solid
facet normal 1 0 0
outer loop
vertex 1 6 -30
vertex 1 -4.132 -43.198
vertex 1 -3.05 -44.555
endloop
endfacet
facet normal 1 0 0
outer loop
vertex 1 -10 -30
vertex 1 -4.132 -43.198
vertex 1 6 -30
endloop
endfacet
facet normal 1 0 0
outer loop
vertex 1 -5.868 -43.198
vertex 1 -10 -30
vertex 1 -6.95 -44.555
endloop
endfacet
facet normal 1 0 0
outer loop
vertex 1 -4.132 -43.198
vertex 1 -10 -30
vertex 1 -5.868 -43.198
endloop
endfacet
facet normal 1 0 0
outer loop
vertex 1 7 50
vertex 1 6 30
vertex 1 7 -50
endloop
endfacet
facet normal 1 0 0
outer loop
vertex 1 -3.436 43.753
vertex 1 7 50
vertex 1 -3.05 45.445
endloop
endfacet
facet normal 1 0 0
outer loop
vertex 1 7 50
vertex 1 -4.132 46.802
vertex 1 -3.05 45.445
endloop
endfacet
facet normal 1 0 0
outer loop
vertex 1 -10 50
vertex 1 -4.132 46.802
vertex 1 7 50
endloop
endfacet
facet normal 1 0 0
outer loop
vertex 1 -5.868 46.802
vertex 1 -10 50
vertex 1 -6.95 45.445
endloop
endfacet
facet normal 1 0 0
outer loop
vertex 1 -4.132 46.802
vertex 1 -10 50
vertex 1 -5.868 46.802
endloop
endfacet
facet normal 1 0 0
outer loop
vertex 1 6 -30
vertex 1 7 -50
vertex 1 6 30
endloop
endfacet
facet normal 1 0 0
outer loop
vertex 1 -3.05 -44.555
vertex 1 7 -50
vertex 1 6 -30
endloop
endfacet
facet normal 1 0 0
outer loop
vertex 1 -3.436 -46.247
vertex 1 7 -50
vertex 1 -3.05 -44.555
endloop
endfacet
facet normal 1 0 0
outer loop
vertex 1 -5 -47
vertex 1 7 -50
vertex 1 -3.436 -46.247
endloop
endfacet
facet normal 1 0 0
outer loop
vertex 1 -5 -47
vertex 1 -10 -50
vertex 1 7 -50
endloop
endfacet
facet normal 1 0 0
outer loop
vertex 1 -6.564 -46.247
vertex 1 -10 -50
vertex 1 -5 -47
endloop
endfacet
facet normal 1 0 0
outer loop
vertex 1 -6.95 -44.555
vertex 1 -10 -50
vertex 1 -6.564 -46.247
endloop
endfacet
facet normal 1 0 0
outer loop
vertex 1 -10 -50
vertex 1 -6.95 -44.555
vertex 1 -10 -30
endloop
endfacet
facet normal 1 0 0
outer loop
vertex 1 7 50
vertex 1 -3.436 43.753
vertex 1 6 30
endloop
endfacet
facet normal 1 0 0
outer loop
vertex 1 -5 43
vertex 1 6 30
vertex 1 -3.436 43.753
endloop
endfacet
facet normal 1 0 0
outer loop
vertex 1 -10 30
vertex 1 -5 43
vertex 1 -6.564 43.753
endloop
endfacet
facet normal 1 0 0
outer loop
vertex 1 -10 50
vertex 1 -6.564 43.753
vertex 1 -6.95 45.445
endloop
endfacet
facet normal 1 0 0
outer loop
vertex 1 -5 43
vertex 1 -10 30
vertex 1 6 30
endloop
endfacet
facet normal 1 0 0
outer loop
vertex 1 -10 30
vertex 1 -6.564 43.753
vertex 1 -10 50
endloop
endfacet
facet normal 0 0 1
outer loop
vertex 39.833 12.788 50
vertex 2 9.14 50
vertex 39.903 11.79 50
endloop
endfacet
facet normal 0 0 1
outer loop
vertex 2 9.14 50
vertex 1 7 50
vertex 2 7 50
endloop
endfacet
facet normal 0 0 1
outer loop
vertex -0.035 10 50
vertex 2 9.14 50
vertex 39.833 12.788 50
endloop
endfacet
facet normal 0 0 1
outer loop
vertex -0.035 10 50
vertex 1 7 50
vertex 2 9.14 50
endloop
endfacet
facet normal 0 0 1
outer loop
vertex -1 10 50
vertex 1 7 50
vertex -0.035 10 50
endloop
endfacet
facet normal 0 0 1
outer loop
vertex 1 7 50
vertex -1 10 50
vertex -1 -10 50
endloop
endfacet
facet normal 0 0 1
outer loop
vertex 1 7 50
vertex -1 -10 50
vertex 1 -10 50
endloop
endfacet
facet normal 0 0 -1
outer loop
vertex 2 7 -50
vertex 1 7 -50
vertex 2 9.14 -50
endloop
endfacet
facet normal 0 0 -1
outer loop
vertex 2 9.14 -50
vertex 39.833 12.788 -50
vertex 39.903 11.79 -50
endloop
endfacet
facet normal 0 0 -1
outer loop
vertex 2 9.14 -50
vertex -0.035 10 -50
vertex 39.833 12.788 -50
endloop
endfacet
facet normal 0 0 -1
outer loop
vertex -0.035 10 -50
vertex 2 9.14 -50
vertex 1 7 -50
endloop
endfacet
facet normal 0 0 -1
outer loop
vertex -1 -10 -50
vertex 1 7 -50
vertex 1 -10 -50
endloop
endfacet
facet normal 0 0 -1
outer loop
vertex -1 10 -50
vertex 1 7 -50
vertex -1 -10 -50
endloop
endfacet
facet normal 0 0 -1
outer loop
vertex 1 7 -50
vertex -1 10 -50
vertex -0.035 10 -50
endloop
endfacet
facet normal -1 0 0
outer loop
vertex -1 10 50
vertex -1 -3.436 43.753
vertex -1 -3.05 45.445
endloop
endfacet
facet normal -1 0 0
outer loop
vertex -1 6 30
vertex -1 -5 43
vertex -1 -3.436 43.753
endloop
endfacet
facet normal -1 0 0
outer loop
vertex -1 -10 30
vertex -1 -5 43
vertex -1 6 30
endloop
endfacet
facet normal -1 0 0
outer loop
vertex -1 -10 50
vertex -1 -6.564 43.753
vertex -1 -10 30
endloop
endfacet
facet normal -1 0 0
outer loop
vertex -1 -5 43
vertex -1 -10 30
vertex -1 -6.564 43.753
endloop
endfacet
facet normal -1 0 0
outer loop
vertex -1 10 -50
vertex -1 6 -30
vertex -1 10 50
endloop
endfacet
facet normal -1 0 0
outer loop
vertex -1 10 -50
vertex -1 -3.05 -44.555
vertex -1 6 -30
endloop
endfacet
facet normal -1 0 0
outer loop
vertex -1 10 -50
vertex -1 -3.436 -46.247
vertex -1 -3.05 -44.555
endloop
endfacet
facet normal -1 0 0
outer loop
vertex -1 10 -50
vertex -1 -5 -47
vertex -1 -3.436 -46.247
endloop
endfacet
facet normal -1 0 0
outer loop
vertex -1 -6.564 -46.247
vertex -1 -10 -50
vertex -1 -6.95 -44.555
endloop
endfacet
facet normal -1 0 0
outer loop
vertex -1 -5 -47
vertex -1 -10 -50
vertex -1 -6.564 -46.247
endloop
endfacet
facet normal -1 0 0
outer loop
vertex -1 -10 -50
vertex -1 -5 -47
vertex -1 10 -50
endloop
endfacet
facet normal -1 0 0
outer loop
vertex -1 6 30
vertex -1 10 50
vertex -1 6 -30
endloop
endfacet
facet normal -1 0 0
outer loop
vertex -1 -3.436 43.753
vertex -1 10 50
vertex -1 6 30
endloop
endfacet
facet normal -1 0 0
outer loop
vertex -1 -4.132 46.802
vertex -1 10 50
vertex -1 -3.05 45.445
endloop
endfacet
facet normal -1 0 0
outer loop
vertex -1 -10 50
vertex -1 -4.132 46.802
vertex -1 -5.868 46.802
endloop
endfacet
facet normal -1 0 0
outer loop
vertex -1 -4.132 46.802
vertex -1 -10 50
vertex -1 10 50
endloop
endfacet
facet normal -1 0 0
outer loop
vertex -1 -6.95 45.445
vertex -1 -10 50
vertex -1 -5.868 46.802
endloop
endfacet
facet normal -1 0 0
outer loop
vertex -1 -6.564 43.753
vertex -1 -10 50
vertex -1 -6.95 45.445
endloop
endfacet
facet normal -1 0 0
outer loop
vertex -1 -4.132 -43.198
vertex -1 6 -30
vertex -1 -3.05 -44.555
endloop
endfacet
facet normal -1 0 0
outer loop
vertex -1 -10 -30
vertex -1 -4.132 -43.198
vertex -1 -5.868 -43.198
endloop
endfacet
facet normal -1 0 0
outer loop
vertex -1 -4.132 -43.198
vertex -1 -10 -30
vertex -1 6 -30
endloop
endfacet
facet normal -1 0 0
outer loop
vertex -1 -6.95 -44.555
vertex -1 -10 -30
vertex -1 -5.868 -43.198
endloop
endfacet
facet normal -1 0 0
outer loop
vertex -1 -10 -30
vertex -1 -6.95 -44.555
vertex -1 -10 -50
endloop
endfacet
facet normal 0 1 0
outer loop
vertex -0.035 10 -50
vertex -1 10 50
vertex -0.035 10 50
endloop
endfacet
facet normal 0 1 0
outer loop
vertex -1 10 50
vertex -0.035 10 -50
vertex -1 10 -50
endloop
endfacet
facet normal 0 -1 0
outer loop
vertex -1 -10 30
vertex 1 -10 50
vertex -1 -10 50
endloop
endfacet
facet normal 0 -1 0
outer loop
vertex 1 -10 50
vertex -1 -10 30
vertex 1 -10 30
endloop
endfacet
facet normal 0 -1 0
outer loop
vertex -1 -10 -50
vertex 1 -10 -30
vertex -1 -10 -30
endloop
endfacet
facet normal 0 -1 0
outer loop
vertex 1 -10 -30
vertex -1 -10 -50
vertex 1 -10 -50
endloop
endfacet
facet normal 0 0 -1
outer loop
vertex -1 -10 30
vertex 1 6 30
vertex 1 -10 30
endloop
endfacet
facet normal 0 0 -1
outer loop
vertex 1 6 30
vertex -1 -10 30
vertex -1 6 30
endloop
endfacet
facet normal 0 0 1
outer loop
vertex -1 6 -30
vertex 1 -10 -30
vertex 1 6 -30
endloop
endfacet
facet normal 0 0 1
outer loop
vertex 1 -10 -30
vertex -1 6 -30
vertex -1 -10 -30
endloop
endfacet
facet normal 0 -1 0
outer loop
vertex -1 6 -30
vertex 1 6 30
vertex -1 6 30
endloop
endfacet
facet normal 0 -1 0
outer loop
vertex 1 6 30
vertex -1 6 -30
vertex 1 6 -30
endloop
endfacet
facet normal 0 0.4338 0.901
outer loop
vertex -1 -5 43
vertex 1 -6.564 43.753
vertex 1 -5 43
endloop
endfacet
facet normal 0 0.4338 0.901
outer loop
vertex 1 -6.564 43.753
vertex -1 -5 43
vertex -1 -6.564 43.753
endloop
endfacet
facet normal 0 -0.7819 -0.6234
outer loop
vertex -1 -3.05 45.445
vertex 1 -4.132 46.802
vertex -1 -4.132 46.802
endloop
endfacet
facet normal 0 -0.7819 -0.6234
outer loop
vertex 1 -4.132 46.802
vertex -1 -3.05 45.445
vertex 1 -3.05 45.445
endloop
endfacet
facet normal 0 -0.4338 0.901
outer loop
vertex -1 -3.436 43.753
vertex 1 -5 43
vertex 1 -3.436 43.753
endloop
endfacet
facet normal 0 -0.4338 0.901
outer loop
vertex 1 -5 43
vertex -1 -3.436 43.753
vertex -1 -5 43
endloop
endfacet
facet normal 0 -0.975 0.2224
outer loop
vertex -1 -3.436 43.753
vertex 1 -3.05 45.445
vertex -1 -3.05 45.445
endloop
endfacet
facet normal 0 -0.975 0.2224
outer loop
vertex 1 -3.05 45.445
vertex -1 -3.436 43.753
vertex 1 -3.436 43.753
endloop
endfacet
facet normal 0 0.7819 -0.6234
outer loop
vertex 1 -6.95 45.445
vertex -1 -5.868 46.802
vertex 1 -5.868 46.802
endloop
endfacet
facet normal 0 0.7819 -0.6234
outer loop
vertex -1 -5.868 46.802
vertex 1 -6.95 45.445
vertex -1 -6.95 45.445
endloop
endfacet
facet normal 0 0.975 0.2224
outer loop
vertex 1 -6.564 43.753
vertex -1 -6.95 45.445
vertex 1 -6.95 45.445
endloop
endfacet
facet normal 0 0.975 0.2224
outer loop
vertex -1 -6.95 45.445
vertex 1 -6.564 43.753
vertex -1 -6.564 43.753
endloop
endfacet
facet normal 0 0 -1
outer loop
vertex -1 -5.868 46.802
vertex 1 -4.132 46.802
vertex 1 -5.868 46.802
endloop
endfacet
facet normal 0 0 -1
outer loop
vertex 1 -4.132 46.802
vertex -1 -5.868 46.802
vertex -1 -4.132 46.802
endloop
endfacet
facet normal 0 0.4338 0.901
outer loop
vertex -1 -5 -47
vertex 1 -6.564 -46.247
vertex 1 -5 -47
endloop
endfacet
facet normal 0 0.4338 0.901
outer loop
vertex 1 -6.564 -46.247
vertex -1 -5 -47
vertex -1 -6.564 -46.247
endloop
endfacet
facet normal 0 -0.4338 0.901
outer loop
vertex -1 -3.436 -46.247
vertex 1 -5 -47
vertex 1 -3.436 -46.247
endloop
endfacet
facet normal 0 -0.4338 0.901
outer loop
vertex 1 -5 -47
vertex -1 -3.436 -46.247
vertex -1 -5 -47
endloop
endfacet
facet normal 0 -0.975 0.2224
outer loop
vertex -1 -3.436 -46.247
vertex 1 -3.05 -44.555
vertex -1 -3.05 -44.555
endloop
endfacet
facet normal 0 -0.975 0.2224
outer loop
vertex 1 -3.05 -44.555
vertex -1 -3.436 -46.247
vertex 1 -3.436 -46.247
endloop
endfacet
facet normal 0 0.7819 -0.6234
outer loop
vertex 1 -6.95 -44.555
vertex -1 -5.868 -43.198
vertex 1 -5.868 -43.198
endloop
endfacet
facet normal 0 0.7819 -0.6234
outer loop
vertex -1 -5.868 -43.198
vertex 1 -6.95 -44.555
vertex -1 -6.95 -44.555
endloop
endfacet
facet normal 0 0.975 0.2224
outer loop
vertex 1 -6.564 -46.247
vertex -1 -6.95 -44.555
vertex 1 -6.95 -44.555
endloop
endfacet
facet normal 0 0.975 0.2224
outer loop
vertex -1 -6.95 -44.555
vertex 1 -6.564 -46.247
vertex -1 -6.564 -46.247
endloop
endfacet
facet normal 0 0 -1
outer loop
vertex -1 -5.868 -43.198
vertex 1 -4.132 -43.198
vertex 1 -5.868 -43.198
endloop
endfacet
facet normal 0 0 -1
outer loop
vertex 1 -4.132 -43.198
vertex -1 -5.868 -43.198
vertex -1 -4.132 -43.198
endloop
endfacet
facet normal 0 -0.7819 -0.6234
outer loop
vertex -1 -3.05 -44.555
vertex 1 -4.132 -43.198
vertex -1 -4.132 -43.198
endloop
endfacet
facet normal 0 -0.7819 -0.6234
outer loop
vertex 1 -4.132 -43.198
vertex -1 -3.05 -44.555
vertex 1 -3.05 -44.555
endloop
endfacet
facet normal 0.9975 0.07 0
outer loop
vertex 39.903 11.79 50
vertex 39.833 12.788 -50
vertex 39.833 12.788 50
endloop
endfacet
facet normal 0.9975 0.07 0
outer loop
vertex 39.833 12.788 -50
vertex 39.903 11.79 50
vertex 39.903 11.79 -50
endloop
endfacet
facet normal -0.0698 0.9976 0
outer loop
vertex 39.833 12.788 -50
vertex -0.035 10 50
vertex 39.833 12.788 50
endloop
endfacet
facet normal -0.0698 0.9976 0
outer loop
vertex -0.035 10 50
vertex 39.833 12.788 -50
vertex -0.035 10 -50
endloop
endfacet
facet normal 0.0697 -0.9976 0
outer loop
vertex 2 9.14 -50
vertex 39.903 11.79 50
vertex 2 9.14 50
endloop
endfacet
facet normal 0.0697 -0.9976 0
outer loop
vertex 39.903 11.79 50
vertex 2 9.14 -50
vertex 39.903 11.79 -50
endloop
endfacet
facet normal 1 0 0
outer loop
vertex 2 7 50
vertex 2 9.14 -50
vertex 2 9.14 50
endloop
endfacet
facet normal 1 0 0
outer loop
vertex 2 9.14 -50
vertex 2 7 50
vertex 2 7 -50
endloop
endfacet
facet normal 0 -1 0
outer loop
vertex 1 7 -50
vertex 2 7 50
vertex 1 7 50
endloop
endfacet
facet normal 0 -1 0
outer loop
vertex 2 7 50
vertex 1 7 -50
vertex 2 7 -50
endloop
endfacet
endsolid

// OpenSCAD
difference() {
  cube([2, 20, 100], center = true);
  translate([0, -3, 0]) cube([4, 18, 60], center = true);
  translate([0, -5, 45]) rotate([0,90,0]) cylinder(d=4, h=6, center = true);
  translate([0, -5, -45]) rotate([0,90,0]) cylinder(d=4, h=6, center = true);
} 

translate([0, 9, -50]) rotate([0,0,4]) cube([40,1,100]);
translate([0, 7, -50]) cube([2,3,100]);
